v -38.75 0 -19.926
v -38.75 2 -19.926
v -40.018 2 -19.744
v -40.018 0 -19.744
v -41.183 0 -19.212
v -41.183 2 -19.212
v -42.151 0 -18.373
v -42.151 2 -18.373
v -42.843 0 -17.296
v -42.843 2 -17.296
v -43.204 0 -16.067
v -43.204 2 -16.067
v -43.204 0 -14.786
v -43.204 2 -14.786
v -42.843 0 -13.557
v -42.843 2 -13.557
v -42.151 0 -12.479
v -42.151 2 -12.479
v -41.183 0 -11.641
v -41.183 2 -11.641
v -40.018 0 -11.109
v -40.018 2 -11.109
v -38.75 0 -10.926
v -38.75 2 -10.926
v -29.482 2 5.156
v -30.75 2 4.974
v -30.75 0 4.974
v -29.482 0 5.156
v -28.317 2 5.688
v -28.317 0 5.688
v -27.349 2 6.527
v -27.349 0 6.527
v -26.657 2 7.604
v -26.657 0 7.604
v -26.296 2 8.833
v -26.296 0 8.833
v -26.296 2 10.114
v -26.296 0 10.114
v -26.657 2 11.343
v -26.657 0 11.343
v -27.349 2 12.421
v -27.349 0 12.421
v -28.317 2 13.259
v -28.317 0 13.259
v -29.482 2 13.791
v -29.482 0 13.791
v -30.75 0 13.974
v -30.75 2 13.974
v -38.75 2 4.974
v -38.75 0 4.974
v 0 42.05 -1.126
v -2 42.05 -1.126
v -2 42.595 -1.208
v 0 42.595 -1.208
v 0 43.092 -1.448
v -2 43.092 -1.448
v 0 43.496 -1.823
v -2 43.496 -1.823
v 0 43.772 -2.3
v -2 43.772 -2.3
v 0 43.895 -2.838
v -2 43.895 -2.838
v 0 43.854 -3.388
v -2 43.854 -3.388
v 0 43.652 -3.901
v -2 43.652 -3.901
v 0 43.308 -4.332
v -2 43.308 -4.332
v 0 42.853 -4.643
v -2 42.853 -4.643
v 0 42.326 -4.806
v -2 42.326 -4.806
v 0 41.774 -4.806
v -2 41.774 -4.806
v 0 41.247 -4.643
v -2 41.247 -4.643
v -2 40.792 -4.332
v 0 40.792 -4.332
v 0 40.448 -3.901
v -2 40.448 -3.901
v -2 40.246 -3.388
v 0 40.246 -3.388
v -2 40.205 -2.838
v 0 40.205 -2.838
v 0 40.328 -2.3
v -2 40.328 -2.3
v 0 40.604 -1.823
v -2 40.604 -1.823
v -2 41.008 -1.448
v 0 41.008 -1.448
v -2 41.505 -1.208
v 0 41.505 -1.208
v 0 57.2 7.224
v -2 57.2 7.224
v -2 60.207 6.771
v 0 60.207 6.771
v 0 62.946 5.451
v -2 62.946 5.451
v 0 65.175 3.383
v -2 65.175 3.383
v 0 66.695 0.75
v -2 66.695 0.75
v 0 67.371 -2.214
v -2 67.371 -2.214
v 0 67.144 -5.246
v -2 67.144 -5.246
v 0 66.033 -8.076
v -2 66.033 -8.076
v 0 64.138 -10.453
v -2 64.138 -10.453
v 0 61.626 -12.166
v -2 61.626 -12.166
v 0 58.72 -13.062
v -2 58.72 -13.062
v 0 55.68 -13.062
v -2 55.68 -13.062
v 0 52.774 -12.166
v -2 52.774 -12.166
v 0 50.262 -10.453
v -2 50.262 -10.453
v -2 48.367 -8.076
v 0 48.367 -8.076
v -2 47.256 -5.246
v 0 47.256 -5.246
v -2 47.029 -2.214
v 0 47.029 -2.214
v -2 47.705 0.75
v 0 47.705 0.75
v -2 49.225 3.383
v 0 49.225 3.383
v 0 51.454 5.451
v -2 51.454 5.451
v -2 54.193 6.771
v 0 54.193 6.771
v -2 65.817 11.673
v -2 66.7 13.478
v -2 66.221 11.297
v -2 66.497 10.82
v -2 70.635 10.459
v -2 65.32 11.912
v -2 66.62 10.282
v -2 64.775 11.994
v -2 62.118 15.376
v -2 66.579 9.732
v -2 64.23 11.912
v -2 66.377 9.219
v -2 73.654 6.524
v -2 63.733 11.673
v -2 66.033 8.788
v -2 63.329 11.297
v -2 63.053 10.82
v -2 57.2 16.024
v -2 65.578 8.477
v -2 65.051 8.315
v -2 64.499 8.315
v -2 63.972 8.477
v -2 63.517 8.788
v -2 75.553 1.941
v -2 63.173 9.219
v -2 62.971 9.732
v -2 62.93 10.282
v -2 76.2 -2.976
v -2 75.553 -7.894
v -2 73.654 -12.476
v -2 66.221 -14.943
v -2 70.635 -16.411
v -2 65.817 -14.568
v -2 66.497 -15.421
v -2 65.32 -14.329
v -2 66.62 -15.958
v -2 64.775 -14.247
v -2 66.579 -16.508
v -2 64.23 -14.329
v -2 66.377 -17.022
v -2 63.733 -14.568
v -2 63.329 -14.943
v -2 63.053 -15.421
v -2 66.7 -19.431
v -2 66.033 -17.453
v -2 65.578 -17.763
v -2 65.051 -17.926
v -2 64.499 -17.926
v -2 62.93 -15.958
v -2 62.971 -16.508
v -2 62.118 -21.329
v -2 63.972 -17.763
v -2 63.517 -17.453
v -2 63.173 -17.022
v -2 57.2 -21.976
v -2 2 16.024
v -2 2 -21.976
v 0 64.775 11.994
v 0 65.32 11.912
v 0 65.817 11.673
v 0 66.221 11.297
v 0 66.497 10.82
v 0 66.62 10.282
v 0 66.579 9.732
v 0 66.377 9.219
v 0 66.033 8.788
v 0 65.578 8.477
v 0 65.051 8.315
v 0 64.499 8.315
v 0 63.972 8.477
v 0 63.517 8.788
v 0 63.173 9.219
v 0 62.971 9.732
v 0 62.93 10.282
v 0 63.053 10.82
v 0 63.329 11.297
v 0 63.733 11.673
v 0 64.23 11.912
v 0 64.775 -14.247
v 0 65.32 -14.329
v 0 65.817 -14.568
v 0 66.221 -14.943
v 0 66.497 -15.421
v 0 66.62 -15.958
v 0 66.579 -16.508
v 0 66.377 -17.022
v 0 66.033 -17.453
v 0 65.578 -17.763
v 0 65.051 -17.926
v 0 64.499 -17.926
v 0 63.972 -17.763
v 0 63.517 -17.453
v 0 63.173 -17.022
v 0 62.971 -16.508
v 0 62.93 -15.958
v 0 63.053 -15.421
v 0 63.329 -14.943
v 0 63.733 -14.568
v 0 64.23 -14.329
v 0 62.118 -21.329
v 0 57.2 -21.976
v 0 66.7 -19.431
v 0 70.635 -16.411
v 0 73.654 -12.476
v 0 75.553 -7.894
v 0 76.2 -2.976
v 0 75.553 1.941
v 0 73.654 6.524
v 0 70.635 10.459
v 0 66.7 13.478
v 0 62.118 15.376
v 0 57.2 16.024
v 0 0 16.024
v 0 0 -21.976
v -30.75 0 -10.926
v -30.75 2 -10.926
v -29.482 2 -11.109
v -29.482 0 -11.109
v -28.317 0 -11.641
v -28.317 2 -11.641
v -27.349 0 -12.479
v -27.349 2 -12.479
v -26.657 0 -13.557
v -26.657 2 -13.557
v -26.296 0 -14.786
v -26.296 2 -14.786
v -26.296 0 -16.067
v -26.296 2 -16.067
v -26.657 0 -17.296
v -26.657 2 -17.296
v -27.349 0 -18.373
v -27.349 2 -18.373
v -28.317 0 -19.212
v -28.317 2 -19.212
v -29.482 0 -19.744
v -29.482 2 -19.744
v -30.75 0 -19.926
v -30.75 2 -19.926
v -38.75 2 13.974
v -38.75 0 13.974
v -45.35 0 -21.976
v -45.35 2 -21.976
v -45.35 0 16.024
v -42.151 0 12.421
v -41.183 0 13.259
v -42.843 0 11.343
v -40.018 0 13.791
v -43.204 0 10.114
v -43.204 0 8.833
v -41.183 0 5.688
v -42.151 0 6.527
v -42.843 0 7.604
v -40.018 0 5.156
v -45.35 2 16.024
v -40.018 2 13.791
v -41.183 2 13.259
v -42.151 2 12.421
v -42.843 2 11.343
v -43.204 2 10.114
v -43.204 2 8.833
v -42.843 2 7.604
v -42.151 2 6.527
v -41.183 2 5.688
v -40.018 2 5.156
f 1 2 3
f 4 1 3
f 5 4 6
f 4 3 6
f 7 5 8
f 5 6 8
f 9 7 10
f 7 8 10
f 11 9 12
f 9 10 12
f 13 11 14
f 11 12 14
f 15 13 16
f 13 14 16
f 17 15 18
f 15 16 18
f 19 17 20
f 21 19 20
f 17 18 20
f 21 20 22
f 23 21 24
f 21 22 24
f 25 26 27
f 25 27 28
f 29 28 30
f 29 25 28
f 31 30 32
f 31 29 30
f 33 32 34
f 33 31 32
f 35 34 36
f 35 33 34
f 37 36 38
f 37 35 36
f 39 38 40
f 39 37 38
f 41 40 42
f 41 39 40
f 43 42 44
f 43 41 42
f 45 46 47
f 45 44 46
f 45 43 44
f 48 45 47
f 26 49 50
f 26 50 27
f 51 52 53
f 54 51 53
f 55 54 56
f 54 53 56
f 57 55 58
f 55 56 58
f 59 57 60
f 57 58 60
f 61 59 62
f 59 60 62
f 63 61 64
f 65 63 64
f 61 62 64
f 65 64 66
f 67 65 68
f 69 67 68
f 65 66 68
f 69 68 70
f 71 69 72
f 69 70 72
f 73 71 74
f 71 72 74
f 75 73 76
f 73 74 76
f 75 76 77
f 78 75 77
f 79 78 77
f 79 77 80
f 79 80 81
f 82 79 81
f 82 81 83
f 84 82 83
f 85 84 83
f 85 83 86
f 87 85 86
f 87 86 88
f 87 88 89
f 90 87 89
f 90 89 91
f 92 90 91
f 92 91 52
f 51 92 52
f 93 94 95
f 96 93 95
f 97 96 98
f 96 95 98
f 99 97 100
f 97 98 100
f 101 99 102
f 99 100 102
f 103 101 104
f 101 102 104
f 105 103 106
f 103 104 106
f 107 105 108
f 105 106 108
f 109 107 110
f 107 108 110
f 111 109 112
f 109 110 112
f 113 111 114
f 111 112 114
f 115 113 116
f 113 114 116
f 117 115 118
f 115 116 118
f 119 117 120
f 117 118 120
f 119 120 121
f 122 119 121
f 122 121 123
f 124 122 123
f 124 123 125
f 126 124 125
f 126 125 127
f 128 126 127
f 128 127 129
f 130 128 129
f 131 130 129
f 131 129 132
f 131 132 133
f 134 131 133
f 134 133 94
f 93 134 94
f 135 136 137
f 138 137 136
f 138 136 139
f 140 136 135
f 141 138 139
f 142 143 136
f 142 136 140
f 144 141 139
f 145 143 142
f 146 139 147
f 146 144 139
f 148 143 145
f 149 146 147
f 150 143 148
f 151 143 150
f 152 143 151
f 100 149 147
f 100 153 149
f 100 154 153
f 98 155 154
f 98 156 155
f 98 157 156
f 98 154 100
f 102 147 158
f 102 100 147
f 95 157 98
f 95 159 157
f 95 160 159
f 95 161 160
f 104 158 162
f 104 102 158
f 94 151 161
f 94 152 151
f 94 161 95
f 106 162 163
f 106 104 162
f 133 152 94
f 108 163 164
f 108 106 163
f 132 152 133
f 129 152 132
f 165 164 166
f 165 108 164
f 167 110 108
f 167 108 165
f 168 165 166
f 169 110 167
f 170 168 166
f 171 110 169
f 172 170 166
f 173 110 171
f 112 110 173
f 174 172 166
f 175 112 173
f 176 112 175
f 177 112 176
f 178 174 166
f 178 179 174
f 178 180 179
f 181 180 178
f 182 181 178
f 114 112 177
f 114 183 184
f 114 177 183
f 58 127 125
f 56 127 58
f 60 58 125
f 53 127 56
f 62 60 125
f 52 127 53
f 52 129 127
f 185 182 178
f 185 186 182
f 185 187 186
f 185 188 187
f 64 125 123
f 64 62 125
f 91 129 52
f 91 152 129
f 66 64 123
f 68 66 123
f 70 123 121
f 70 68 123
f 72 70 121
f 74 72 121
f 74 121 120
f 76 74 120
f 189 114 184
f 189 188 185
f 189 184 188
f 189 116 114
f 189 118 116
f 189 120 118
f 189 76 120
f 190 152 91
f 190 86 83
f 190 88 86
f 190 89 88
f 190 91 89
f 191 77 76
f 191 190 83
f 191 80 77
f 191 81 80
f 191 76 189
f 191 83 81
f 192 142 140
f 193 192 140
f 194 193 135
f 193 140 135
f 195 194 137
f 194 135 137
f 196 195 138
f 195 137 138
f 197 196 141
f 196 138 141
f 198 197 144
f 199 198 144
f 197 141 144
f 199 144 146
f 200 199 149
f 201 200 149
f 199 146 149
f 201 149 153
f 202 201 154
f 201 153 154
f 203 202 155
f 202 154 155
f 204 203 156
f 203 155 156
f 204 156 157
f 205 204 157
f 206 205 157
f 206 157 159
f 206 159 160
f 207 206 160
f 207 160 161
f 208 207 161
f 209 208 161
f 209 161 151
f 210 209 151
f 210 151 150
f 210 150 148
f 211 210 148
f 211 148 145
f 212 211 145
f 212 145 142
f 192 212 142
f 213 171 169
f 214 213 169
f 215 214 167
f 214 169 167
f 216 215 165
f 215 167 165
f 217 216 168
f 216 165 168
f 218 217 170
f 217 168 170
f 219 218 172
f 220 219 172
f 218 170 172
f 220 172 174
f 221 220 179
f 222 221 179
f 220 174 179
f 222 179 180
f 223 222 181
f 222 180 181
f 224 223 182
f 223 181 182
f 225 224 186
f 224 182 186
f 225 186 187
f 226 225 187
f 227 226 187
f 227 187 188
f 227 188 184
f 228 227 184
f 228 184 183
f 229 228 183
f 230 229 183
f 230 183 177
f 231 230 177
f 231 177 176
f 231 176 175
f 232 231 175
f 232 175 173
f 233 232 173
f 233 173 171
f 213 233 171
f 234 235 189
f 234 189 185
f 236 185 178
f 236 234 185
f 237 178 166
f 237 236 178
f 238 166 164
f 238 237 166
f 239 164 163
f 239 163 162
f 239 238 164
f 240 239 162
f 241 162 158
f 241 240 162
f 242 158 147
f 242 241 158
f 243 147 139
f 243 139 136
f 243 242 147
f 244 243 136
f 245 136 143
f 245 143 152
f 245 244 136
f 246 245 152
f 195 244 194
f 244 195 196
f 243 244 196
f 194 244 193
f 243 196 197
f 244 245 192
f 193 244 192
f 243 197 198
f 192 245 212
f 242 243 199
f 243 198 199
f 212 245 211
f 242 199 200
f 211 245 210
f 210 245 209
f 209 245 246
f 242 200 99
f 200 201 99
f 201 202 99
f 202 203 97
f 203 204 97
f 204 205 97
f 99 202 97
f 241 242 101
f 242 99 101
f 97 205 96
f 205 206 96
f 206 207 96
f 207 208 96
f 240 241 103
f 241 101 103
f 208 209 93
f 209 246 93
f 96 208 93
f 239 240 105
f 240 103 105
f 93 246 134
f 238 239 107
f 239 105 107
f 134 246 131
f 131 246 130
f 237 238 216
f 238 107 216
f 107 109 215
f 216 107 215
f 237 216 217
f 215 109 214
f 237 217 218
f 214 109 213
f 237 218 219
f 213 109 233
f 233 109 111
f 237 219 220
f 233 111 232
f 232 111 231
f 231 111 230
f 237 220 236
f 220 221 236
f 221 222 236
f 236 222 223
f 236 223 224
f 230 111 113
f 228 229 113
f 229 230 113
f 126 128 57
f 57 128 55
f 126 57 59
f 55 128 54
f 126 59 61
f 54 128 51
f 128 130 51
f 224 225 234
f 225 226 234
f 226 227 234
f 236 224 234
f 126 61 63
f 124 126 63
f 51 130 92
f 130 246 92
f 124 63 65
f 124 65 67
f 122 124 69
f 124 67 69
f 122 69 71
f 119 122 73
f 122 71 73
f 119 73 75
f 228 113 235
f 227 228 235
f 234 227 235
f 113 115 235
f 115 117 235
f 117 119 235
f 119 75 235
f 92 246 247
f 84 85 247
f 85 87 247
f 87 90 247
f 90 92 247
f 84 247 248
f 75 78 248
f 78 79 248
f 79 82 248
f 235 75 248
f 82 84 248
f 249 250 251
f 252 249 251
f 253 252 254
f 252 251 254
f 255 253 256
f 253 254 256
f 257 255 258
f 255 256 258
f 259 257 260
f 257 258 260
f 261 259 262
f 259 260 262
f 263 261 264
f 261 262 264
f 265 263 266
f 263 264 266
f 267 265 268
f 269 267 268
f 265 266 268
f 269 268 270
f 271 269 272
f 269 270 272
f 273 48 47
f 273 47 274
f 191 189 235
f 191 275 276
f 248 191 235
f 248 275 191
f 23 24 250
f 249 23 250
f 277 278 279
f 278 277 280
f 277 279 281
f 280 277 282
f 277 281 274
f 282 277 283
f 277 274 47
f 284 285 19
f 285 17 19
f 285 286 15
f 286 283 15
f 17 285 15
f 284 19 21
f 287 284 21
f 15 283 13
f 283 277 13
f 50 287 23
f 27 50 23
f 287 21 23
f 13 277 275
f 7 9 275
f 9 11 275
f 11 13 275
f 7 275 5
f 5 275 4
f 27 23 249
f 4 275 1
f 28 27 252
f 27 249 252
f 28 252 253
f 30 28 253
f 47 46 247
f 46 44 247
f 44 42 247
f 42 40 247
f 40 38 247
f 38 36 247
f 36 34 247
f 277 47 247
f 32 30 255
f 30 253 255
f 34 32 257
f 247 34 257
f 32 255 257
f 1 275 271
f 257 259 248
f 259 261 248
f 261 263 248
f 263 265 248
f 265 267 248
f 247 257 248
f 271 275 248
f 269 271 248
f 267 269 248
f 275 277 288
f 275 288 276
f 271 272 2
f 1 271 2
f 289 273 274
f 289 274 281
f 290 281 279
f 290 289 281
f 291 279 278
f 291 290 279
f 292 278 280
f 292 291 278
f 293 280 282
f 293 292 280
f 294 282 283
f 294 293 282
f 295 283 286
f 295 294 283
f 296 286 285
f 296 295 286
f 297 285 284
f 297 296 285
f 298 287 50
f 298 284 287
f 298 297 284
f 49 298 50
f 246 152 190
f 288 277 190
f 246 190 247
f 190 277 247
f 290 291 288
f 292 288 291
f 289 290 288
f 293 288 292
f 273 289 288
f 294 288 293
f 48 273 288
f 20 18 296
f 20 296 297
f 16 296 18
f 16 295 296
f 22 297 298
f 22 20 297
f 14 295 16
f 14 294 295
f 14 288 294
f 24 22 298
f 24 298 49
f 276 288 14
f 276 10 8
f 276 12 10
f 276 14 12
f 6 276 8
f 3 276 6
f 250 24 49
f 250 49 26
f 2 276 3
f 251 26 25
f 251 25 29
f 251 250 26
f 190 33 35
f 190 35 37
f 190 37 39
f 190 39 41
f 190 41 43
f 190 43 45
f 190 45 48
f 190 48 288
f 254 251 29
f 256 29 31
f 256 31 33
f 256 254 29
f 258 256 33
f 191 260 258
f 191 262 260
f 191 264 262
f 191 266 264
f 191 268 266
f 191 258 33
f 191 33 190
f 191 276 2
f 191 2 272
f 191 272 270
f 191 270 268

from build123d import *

# Parameters (mm, degrees)
SKETCH1_W           = 45.35
SKETCH1_H           = 38
BOSS_EXTRUDE1_DEPTH = 2
SKETCH2_W           = 2
SKETCH2_H           = 38
BOSS_EXTRUDE2_DEPTH = 74.25
SKETCH3_R           = 10.2
SKETCH3_R_2         = 1.85
CUT_EXTRUDE1_DEPTH  = 50
CUT_EXTRUDE2_DEPTH  = 46.35
CUT_EXTRUDE3_DEPTH  = 3


with BuildPart() as part:
    # Sketch1 → Boss-Extrude1 (new body)
    with BuildSketch(Plane(origin=(0, 0, 0), x_dir=(1, 0, 0), z_dir=(0, 1, 0))):
        with Locations((-22.675, 2.976284585)):
            Rectangle(SKETCH1_W, SKETCH1_H)
    extrude(amount=BOSS_EXTRUDE1_DEPTH)

    # Sketch2 → Boss-Extrude2 (add)
    with BuildSketch(Plane(origin=(0, 2, 0), x_dir=(1, 0, 0), z_dir=(0, 1, 0))):
        with Locations((-1, 2.976284585)):
            Rectangle(SKETCH2_W, SKETCH2_H)
    extrude(amount=BOSS_EXTRUDE2_DEPTH)

    # Sketch3 → Cut-Extrude1 (cut)
    with BuildSketch(Plane.ZY.offset(2)):
        with Locations((-2.976284585, 57.2)):
            Circle(SKETCH3_R)
        with Locations((-16.096569452, 64.775)):
            Circle(SKETCH3_R_2)
        with Locations((10.144000282, 64.775)):
            Circle(SKETCH3_R_2)
        with Locations((-2.976284585, 42.05)):
            Circle(SKETCH3_R_2)
    extrude(amount=-CUT_EXTRUDE1_DEPTH, mode=Mode.SUBTRACT)

    # Sketch14 → Cut-Extrude2 (cut, through all)
    with BuildSketch(Plane(origin=(0, 0, 0), x_dir=(0, 0, -1), z_dir=(1, 0, 0))):
        with BuildLine():
            Line((-16.023715415, 57.2), (-16.023715415, 90.282409195))
            Line((-16.023715415, 90.282409195), (21.976284585, 90.282409195))
            Line((21.976284585, 90.282409195), (21.976284585, 57.2))
            ThreePointArc((21.976284585, 57.2), (2.976284585, 76.2), (-16.023715415, 57.2))
        make_face()
    extrude(amount=-CUT_EXTRUDE2_DEPTH, mode=Mode.SUBTRACT)

    # Sketch15 → Cut-Extrude3 (cut, through all)
    with BuildSketch(Plane(origin=(0, 2, 0), x_dir=(1, 0, 0), z_dir=(0, 1, 0))):
        with BuildLine():
            Line((-30.75, -13.973715415), (-38.75, -13.973715415))
            ThreePointArc((-38.75, -13.973715415), (-43.25, -9.473715415), (-38.75, -4.973715415))
            Line((-38.75, -4.973715415), (-30.75, -4.973715415))
            ThreePointArc((-30.75, -4.973715415), (-26.25, -9.473715415), (-30.75, -13.973715415))
        make_face()
        with BuildLine():
            Line((-30.75, 19.926284585), (-38.75, 19.926284585))
            ThreePointArc((-38.75, 19.926284585), (-43.25, 15.426284585), (-38.75, 10.926284585))
            Line((-38.75, 10.926284585), (-30.75, 10.926284585))
            ThreePointArc((-30.75, 10.926284585), (-26.25, 15.426284585), (-30.75, 19.926284585))
        make_face()
    extrude(amount=-CUT_EXTRUDE3_DEPTH, mode=Mode.SUBTRACT)


solid = part.part
